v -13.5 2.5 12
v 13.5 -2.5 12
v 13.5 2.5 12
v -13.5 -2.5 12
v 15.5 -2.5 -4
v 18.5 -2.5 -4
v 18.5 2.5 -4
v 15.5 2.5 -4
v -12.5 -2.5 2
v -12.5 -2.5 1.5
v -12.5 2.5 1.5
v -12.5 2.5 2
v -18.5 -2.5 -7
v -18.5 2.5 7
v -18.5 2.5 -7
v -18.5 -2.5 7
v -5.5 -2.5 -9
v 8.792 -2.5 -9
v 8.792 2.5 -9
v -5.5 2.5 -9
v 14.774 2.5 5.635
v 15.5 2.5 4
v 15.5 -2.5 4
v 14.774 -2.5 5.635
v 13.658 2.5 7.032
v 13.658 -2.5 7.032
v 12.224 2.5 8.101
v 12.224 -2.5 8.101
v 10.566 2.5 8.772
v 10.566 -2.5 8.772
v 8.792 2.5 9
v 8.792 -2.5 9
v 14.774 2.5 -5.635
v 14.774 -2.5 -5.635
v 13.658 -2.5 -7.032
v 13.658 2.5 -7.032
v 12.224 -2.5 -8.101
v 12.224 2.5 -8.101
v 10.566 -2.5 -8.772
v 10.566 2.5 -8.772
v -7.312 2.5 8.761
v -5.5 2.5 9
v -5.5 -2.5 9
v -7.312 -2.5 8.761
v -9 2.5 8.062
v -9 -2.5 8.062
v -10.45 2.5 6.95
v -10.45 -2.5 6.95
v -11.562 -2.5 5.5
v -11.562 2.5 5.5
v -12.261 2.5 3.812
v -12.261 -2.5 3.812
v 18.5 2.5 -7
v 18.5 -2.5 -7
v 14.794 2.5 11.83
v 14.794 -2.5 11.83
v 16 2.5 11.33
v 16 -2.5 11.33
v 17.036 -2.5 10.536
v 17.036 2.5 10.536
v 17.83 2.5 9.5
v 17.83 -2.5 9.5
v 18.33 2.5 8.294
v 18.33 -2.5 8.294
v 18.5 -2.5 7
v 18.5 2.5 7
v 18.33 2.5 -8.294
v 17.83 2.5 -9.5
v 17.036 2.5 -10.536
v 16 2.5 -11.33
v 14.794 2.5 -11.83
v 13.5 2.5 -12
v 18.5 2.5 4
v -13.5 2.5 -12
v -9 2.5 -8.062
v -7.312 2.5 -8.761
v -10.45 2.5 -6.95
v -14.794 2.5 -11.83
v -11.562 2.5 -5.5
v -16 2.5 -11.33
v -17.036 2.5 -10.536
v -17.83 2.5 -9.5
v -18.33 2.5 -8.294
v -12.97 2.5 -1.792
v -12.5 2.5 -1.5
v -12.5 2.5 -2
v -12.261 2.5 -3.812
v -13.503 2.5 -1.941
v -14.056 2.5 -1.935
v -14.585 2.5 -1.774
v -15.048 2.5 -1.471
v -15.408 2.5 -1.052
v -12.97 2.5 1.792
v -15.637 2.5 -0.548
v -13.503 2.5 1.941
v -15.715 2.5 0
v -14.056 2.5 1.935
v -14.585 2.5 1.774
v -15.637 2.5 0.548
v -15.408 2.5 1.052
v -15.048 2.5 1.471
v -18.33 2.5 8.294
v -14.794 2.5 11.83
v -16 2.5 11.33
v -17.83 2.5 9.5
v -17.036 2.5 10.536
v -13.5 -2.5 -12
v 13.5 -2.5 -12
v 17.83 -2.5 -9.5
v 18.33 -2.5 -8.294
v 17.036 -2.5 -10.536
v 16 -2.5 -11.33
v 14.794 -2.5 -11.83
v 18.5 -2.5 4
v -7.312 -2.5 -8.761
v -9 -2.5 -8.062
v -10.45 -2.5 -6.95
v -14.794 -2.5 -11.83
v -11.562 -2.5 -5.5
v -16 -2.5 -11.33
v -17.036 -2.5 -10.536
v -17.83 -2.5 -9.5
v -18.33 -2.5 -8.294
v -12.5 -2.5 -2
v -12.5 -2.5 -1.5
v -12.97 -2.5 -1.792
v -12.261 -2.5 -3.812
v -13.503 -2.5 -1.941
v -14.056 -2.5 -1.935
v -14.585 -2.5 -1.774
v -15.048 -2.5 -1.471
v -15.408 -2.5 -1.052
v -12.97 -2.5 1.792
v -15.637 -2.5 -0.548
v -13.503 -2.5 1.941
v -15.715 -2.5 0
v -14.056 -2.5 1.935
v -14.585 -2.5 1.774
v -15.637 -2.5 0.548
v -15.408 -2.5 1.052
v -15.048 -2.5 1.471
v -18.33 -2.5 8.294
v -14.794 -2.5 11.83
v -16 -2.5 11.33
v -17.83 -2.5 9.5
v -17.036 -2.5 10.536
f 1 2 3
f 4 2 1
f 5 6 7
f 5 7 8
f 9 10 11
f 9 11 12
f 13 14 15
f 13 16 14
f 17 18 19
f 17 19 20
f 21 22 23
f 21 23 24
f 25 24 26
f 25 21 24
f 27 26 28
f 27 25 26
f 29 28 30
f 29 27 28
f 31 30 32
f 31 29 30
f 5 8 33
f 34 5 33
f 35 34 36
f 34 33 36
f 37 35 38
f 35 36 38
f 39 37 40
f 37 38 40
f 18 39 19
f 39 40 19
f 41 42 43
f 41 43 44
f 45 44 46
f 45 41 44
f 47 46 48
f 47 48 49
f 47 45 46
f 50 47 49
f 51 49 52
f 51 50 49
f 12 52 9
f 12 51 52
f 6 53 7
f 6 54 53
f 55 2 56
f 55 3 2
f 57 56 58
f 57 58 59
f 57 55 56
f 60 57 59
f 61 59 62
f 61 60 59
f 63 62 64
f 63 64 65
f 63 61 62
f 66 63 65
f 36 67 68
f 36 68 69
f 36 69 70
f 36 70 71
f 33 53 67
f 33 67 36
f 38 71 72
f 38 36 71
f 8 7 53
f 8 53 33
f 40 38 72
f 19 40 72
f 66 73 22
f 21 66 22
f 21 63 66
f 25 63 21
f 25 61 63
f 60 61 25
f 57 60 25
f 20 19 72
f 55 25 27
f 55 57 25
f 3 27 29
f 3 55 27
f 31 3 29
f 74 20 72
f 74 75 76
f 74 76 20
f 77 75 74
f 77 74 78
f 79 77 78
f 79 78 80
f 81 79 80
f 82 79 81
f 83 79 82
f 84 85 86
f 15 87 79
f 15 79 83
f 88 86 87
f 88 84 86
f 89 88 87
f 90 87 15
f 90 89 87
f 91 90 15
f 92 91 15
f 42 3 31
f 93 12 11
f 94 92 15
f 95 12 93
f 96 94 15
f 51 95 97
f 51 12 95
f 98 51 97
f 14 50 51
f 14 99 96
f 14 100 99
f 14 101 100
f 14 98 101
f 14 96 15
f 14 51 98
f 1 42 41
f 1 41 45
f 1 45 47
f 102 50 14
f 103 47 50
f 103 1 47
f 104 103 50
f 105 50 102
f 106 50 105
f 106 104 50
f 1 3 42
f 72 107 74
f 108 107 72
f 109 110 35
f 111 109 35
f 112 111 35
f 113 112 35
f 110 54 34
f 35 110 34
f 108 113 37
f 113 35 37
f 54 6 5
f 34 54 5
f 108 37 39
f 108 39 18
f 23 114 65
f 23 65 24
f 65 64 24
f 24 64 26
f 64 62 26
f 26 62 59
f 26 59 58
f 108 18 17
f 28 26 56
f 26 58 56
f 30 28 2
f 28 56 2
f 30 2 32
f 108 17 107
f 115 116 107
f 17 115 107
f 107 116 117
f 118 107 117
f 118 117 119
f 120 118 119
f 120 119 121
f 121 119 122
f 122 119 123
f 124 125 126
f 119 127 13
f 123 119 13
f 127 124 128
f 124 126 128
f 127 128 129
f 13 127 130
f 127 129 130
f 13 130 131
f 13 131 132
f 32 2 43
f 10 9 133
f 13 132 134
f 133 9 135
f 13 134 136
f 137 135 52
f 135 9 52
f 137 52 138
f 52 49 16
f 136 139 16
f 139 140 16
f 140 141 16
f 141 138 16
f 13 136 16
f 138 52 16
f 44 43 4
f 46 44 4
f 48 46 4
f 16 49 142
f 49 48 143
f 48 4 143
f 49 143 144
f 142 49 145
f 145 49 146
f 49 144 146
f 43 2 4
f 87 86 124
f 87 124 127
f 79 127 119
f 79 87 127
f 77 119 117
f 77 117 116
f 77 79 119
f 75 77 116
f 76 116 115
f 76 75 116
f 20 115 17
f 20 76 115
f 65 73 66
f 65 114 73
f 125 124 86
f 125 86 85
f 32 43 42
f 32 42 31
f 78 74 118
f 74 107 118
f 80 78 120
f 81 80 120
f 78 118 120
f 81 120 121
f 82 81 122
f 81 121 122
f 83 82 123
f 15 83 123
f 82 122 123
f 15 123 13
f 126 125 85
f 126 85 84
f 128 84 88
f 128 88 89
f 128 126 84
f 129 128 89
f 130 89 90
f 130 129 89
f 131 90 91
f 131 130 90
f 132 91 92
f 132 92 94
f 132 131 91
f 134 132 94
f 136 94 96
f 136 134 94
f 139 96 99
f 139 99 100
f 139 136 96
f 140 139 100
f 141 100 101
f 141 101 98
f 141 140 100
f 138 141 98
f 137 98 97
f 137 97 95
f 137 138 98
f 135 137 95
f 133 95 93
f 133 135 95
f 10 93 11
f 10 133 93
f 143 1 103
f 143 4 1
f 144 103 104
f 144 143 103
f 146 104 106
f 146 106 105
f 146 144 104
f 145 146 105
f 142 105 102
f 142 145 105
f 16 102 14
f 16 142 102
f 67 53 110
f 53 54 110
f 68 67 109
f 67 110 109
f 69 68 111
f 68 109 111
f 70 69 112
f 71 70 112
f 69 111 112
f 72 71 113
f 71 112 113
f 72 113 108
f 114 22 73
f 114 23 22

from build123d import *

# Parameters (mm, degrees)
F1_DEPTH    = 2.5
F2_R        = 5
F3_T1_DEPTH = 5


# Not quite as in the source:
# - a fillet or chamfer that OpenCascade refuses, or shapes differently, is made with other operations: its cross-section is extruded or revolved along the edge and cut away or added


with BuildPart() as f1:
    # F0 (on Front) → F1 (new body, symmetric)
    with BuildSketch(Plane.XZ):
        with BuildLine():
            Line((18.5, 12), (-18.5, 12))
            Line((-18.5, 12), (-18.5, -12))
            Line((-18.5, -12), (18.5, -12))
            Line((18.5, -12), (18.5, -4))
            Line((18.5, -4), (15.5, -4))
            Line((15.5, -4), (15.5, -9))
            Line((15.5, -9), (-12.5, -9))
            Line((-12.5, -9), (-12.5, -1.5))
            ThreePointArc((-12.5, -1.5), (-15.714868952, 0), (-12.5, 1.5))
            Line((-12.5, 1.5), (-12.5, 9))
            Line((-12.5, 9), (15.5, 9))
            Line((15.5, 9), (15.5, 4))
            Line((15.5, 4), (18.5, 4))
            Line((18.5, 4), (18.5, 12))
        make_face()
    extrude(amount=F1_DEPTH, both=True)

    # F2
    f2_edges = [f1.edges().sort_by_distance(p)[0] for p in [
        (-18.5, 0, 12),
        (18.5, 0, 12),
        (18.5, 0, -12),
        (-18.5, 0, -12),
    ]]
    fillet(f2_edges, radius=F2_R)

    # F3: fillet of radius 7 on 4 edges, made by hand

    # F3_s2 → F3_t1 (join)
    with BuildSketch(Plane.XZ.offset(-2.5)):
        with BuildLine():
            ThreePointArc((15.5, 4), (12.9750962002, 7.6124860802), (8.7917960675, 9))
            Line((8.7917960675, 9), (15.5, 9))
            Line((15.5, 9), (15.5, 4))
        make_face()
        with BuildLine():
            ThreePointArc((15.5, -4), (12.9750962002, -7.6124860802), (8.7917960675, -9))
            Line((8.7917960675, -9), (15.5, -9))
            Line((15.5, -9), (15.5, -4))
        make_face()
        with BuildLine():
            ThreePointArc((-12.5, -2), (-10.4497474683, -6.9497474683), (-5.5, -9))
            Line((-5.5, -9), (-12.5, -9))
            Line((-12.5, -9), (-12.5, -2))
        make_face()
        with BuildLine():
            ThreePointArc((-5.5, 9), (-10.4497474683, 6.9497474683), (-12.5, 2))
            Line((-12.5, 2), (-12.5, 9))
            Line((-12.5, 9), (-5.5, 9))
        make_face()
    extrude(amount=F3_T1_DEPTH)


solid = f1.part
